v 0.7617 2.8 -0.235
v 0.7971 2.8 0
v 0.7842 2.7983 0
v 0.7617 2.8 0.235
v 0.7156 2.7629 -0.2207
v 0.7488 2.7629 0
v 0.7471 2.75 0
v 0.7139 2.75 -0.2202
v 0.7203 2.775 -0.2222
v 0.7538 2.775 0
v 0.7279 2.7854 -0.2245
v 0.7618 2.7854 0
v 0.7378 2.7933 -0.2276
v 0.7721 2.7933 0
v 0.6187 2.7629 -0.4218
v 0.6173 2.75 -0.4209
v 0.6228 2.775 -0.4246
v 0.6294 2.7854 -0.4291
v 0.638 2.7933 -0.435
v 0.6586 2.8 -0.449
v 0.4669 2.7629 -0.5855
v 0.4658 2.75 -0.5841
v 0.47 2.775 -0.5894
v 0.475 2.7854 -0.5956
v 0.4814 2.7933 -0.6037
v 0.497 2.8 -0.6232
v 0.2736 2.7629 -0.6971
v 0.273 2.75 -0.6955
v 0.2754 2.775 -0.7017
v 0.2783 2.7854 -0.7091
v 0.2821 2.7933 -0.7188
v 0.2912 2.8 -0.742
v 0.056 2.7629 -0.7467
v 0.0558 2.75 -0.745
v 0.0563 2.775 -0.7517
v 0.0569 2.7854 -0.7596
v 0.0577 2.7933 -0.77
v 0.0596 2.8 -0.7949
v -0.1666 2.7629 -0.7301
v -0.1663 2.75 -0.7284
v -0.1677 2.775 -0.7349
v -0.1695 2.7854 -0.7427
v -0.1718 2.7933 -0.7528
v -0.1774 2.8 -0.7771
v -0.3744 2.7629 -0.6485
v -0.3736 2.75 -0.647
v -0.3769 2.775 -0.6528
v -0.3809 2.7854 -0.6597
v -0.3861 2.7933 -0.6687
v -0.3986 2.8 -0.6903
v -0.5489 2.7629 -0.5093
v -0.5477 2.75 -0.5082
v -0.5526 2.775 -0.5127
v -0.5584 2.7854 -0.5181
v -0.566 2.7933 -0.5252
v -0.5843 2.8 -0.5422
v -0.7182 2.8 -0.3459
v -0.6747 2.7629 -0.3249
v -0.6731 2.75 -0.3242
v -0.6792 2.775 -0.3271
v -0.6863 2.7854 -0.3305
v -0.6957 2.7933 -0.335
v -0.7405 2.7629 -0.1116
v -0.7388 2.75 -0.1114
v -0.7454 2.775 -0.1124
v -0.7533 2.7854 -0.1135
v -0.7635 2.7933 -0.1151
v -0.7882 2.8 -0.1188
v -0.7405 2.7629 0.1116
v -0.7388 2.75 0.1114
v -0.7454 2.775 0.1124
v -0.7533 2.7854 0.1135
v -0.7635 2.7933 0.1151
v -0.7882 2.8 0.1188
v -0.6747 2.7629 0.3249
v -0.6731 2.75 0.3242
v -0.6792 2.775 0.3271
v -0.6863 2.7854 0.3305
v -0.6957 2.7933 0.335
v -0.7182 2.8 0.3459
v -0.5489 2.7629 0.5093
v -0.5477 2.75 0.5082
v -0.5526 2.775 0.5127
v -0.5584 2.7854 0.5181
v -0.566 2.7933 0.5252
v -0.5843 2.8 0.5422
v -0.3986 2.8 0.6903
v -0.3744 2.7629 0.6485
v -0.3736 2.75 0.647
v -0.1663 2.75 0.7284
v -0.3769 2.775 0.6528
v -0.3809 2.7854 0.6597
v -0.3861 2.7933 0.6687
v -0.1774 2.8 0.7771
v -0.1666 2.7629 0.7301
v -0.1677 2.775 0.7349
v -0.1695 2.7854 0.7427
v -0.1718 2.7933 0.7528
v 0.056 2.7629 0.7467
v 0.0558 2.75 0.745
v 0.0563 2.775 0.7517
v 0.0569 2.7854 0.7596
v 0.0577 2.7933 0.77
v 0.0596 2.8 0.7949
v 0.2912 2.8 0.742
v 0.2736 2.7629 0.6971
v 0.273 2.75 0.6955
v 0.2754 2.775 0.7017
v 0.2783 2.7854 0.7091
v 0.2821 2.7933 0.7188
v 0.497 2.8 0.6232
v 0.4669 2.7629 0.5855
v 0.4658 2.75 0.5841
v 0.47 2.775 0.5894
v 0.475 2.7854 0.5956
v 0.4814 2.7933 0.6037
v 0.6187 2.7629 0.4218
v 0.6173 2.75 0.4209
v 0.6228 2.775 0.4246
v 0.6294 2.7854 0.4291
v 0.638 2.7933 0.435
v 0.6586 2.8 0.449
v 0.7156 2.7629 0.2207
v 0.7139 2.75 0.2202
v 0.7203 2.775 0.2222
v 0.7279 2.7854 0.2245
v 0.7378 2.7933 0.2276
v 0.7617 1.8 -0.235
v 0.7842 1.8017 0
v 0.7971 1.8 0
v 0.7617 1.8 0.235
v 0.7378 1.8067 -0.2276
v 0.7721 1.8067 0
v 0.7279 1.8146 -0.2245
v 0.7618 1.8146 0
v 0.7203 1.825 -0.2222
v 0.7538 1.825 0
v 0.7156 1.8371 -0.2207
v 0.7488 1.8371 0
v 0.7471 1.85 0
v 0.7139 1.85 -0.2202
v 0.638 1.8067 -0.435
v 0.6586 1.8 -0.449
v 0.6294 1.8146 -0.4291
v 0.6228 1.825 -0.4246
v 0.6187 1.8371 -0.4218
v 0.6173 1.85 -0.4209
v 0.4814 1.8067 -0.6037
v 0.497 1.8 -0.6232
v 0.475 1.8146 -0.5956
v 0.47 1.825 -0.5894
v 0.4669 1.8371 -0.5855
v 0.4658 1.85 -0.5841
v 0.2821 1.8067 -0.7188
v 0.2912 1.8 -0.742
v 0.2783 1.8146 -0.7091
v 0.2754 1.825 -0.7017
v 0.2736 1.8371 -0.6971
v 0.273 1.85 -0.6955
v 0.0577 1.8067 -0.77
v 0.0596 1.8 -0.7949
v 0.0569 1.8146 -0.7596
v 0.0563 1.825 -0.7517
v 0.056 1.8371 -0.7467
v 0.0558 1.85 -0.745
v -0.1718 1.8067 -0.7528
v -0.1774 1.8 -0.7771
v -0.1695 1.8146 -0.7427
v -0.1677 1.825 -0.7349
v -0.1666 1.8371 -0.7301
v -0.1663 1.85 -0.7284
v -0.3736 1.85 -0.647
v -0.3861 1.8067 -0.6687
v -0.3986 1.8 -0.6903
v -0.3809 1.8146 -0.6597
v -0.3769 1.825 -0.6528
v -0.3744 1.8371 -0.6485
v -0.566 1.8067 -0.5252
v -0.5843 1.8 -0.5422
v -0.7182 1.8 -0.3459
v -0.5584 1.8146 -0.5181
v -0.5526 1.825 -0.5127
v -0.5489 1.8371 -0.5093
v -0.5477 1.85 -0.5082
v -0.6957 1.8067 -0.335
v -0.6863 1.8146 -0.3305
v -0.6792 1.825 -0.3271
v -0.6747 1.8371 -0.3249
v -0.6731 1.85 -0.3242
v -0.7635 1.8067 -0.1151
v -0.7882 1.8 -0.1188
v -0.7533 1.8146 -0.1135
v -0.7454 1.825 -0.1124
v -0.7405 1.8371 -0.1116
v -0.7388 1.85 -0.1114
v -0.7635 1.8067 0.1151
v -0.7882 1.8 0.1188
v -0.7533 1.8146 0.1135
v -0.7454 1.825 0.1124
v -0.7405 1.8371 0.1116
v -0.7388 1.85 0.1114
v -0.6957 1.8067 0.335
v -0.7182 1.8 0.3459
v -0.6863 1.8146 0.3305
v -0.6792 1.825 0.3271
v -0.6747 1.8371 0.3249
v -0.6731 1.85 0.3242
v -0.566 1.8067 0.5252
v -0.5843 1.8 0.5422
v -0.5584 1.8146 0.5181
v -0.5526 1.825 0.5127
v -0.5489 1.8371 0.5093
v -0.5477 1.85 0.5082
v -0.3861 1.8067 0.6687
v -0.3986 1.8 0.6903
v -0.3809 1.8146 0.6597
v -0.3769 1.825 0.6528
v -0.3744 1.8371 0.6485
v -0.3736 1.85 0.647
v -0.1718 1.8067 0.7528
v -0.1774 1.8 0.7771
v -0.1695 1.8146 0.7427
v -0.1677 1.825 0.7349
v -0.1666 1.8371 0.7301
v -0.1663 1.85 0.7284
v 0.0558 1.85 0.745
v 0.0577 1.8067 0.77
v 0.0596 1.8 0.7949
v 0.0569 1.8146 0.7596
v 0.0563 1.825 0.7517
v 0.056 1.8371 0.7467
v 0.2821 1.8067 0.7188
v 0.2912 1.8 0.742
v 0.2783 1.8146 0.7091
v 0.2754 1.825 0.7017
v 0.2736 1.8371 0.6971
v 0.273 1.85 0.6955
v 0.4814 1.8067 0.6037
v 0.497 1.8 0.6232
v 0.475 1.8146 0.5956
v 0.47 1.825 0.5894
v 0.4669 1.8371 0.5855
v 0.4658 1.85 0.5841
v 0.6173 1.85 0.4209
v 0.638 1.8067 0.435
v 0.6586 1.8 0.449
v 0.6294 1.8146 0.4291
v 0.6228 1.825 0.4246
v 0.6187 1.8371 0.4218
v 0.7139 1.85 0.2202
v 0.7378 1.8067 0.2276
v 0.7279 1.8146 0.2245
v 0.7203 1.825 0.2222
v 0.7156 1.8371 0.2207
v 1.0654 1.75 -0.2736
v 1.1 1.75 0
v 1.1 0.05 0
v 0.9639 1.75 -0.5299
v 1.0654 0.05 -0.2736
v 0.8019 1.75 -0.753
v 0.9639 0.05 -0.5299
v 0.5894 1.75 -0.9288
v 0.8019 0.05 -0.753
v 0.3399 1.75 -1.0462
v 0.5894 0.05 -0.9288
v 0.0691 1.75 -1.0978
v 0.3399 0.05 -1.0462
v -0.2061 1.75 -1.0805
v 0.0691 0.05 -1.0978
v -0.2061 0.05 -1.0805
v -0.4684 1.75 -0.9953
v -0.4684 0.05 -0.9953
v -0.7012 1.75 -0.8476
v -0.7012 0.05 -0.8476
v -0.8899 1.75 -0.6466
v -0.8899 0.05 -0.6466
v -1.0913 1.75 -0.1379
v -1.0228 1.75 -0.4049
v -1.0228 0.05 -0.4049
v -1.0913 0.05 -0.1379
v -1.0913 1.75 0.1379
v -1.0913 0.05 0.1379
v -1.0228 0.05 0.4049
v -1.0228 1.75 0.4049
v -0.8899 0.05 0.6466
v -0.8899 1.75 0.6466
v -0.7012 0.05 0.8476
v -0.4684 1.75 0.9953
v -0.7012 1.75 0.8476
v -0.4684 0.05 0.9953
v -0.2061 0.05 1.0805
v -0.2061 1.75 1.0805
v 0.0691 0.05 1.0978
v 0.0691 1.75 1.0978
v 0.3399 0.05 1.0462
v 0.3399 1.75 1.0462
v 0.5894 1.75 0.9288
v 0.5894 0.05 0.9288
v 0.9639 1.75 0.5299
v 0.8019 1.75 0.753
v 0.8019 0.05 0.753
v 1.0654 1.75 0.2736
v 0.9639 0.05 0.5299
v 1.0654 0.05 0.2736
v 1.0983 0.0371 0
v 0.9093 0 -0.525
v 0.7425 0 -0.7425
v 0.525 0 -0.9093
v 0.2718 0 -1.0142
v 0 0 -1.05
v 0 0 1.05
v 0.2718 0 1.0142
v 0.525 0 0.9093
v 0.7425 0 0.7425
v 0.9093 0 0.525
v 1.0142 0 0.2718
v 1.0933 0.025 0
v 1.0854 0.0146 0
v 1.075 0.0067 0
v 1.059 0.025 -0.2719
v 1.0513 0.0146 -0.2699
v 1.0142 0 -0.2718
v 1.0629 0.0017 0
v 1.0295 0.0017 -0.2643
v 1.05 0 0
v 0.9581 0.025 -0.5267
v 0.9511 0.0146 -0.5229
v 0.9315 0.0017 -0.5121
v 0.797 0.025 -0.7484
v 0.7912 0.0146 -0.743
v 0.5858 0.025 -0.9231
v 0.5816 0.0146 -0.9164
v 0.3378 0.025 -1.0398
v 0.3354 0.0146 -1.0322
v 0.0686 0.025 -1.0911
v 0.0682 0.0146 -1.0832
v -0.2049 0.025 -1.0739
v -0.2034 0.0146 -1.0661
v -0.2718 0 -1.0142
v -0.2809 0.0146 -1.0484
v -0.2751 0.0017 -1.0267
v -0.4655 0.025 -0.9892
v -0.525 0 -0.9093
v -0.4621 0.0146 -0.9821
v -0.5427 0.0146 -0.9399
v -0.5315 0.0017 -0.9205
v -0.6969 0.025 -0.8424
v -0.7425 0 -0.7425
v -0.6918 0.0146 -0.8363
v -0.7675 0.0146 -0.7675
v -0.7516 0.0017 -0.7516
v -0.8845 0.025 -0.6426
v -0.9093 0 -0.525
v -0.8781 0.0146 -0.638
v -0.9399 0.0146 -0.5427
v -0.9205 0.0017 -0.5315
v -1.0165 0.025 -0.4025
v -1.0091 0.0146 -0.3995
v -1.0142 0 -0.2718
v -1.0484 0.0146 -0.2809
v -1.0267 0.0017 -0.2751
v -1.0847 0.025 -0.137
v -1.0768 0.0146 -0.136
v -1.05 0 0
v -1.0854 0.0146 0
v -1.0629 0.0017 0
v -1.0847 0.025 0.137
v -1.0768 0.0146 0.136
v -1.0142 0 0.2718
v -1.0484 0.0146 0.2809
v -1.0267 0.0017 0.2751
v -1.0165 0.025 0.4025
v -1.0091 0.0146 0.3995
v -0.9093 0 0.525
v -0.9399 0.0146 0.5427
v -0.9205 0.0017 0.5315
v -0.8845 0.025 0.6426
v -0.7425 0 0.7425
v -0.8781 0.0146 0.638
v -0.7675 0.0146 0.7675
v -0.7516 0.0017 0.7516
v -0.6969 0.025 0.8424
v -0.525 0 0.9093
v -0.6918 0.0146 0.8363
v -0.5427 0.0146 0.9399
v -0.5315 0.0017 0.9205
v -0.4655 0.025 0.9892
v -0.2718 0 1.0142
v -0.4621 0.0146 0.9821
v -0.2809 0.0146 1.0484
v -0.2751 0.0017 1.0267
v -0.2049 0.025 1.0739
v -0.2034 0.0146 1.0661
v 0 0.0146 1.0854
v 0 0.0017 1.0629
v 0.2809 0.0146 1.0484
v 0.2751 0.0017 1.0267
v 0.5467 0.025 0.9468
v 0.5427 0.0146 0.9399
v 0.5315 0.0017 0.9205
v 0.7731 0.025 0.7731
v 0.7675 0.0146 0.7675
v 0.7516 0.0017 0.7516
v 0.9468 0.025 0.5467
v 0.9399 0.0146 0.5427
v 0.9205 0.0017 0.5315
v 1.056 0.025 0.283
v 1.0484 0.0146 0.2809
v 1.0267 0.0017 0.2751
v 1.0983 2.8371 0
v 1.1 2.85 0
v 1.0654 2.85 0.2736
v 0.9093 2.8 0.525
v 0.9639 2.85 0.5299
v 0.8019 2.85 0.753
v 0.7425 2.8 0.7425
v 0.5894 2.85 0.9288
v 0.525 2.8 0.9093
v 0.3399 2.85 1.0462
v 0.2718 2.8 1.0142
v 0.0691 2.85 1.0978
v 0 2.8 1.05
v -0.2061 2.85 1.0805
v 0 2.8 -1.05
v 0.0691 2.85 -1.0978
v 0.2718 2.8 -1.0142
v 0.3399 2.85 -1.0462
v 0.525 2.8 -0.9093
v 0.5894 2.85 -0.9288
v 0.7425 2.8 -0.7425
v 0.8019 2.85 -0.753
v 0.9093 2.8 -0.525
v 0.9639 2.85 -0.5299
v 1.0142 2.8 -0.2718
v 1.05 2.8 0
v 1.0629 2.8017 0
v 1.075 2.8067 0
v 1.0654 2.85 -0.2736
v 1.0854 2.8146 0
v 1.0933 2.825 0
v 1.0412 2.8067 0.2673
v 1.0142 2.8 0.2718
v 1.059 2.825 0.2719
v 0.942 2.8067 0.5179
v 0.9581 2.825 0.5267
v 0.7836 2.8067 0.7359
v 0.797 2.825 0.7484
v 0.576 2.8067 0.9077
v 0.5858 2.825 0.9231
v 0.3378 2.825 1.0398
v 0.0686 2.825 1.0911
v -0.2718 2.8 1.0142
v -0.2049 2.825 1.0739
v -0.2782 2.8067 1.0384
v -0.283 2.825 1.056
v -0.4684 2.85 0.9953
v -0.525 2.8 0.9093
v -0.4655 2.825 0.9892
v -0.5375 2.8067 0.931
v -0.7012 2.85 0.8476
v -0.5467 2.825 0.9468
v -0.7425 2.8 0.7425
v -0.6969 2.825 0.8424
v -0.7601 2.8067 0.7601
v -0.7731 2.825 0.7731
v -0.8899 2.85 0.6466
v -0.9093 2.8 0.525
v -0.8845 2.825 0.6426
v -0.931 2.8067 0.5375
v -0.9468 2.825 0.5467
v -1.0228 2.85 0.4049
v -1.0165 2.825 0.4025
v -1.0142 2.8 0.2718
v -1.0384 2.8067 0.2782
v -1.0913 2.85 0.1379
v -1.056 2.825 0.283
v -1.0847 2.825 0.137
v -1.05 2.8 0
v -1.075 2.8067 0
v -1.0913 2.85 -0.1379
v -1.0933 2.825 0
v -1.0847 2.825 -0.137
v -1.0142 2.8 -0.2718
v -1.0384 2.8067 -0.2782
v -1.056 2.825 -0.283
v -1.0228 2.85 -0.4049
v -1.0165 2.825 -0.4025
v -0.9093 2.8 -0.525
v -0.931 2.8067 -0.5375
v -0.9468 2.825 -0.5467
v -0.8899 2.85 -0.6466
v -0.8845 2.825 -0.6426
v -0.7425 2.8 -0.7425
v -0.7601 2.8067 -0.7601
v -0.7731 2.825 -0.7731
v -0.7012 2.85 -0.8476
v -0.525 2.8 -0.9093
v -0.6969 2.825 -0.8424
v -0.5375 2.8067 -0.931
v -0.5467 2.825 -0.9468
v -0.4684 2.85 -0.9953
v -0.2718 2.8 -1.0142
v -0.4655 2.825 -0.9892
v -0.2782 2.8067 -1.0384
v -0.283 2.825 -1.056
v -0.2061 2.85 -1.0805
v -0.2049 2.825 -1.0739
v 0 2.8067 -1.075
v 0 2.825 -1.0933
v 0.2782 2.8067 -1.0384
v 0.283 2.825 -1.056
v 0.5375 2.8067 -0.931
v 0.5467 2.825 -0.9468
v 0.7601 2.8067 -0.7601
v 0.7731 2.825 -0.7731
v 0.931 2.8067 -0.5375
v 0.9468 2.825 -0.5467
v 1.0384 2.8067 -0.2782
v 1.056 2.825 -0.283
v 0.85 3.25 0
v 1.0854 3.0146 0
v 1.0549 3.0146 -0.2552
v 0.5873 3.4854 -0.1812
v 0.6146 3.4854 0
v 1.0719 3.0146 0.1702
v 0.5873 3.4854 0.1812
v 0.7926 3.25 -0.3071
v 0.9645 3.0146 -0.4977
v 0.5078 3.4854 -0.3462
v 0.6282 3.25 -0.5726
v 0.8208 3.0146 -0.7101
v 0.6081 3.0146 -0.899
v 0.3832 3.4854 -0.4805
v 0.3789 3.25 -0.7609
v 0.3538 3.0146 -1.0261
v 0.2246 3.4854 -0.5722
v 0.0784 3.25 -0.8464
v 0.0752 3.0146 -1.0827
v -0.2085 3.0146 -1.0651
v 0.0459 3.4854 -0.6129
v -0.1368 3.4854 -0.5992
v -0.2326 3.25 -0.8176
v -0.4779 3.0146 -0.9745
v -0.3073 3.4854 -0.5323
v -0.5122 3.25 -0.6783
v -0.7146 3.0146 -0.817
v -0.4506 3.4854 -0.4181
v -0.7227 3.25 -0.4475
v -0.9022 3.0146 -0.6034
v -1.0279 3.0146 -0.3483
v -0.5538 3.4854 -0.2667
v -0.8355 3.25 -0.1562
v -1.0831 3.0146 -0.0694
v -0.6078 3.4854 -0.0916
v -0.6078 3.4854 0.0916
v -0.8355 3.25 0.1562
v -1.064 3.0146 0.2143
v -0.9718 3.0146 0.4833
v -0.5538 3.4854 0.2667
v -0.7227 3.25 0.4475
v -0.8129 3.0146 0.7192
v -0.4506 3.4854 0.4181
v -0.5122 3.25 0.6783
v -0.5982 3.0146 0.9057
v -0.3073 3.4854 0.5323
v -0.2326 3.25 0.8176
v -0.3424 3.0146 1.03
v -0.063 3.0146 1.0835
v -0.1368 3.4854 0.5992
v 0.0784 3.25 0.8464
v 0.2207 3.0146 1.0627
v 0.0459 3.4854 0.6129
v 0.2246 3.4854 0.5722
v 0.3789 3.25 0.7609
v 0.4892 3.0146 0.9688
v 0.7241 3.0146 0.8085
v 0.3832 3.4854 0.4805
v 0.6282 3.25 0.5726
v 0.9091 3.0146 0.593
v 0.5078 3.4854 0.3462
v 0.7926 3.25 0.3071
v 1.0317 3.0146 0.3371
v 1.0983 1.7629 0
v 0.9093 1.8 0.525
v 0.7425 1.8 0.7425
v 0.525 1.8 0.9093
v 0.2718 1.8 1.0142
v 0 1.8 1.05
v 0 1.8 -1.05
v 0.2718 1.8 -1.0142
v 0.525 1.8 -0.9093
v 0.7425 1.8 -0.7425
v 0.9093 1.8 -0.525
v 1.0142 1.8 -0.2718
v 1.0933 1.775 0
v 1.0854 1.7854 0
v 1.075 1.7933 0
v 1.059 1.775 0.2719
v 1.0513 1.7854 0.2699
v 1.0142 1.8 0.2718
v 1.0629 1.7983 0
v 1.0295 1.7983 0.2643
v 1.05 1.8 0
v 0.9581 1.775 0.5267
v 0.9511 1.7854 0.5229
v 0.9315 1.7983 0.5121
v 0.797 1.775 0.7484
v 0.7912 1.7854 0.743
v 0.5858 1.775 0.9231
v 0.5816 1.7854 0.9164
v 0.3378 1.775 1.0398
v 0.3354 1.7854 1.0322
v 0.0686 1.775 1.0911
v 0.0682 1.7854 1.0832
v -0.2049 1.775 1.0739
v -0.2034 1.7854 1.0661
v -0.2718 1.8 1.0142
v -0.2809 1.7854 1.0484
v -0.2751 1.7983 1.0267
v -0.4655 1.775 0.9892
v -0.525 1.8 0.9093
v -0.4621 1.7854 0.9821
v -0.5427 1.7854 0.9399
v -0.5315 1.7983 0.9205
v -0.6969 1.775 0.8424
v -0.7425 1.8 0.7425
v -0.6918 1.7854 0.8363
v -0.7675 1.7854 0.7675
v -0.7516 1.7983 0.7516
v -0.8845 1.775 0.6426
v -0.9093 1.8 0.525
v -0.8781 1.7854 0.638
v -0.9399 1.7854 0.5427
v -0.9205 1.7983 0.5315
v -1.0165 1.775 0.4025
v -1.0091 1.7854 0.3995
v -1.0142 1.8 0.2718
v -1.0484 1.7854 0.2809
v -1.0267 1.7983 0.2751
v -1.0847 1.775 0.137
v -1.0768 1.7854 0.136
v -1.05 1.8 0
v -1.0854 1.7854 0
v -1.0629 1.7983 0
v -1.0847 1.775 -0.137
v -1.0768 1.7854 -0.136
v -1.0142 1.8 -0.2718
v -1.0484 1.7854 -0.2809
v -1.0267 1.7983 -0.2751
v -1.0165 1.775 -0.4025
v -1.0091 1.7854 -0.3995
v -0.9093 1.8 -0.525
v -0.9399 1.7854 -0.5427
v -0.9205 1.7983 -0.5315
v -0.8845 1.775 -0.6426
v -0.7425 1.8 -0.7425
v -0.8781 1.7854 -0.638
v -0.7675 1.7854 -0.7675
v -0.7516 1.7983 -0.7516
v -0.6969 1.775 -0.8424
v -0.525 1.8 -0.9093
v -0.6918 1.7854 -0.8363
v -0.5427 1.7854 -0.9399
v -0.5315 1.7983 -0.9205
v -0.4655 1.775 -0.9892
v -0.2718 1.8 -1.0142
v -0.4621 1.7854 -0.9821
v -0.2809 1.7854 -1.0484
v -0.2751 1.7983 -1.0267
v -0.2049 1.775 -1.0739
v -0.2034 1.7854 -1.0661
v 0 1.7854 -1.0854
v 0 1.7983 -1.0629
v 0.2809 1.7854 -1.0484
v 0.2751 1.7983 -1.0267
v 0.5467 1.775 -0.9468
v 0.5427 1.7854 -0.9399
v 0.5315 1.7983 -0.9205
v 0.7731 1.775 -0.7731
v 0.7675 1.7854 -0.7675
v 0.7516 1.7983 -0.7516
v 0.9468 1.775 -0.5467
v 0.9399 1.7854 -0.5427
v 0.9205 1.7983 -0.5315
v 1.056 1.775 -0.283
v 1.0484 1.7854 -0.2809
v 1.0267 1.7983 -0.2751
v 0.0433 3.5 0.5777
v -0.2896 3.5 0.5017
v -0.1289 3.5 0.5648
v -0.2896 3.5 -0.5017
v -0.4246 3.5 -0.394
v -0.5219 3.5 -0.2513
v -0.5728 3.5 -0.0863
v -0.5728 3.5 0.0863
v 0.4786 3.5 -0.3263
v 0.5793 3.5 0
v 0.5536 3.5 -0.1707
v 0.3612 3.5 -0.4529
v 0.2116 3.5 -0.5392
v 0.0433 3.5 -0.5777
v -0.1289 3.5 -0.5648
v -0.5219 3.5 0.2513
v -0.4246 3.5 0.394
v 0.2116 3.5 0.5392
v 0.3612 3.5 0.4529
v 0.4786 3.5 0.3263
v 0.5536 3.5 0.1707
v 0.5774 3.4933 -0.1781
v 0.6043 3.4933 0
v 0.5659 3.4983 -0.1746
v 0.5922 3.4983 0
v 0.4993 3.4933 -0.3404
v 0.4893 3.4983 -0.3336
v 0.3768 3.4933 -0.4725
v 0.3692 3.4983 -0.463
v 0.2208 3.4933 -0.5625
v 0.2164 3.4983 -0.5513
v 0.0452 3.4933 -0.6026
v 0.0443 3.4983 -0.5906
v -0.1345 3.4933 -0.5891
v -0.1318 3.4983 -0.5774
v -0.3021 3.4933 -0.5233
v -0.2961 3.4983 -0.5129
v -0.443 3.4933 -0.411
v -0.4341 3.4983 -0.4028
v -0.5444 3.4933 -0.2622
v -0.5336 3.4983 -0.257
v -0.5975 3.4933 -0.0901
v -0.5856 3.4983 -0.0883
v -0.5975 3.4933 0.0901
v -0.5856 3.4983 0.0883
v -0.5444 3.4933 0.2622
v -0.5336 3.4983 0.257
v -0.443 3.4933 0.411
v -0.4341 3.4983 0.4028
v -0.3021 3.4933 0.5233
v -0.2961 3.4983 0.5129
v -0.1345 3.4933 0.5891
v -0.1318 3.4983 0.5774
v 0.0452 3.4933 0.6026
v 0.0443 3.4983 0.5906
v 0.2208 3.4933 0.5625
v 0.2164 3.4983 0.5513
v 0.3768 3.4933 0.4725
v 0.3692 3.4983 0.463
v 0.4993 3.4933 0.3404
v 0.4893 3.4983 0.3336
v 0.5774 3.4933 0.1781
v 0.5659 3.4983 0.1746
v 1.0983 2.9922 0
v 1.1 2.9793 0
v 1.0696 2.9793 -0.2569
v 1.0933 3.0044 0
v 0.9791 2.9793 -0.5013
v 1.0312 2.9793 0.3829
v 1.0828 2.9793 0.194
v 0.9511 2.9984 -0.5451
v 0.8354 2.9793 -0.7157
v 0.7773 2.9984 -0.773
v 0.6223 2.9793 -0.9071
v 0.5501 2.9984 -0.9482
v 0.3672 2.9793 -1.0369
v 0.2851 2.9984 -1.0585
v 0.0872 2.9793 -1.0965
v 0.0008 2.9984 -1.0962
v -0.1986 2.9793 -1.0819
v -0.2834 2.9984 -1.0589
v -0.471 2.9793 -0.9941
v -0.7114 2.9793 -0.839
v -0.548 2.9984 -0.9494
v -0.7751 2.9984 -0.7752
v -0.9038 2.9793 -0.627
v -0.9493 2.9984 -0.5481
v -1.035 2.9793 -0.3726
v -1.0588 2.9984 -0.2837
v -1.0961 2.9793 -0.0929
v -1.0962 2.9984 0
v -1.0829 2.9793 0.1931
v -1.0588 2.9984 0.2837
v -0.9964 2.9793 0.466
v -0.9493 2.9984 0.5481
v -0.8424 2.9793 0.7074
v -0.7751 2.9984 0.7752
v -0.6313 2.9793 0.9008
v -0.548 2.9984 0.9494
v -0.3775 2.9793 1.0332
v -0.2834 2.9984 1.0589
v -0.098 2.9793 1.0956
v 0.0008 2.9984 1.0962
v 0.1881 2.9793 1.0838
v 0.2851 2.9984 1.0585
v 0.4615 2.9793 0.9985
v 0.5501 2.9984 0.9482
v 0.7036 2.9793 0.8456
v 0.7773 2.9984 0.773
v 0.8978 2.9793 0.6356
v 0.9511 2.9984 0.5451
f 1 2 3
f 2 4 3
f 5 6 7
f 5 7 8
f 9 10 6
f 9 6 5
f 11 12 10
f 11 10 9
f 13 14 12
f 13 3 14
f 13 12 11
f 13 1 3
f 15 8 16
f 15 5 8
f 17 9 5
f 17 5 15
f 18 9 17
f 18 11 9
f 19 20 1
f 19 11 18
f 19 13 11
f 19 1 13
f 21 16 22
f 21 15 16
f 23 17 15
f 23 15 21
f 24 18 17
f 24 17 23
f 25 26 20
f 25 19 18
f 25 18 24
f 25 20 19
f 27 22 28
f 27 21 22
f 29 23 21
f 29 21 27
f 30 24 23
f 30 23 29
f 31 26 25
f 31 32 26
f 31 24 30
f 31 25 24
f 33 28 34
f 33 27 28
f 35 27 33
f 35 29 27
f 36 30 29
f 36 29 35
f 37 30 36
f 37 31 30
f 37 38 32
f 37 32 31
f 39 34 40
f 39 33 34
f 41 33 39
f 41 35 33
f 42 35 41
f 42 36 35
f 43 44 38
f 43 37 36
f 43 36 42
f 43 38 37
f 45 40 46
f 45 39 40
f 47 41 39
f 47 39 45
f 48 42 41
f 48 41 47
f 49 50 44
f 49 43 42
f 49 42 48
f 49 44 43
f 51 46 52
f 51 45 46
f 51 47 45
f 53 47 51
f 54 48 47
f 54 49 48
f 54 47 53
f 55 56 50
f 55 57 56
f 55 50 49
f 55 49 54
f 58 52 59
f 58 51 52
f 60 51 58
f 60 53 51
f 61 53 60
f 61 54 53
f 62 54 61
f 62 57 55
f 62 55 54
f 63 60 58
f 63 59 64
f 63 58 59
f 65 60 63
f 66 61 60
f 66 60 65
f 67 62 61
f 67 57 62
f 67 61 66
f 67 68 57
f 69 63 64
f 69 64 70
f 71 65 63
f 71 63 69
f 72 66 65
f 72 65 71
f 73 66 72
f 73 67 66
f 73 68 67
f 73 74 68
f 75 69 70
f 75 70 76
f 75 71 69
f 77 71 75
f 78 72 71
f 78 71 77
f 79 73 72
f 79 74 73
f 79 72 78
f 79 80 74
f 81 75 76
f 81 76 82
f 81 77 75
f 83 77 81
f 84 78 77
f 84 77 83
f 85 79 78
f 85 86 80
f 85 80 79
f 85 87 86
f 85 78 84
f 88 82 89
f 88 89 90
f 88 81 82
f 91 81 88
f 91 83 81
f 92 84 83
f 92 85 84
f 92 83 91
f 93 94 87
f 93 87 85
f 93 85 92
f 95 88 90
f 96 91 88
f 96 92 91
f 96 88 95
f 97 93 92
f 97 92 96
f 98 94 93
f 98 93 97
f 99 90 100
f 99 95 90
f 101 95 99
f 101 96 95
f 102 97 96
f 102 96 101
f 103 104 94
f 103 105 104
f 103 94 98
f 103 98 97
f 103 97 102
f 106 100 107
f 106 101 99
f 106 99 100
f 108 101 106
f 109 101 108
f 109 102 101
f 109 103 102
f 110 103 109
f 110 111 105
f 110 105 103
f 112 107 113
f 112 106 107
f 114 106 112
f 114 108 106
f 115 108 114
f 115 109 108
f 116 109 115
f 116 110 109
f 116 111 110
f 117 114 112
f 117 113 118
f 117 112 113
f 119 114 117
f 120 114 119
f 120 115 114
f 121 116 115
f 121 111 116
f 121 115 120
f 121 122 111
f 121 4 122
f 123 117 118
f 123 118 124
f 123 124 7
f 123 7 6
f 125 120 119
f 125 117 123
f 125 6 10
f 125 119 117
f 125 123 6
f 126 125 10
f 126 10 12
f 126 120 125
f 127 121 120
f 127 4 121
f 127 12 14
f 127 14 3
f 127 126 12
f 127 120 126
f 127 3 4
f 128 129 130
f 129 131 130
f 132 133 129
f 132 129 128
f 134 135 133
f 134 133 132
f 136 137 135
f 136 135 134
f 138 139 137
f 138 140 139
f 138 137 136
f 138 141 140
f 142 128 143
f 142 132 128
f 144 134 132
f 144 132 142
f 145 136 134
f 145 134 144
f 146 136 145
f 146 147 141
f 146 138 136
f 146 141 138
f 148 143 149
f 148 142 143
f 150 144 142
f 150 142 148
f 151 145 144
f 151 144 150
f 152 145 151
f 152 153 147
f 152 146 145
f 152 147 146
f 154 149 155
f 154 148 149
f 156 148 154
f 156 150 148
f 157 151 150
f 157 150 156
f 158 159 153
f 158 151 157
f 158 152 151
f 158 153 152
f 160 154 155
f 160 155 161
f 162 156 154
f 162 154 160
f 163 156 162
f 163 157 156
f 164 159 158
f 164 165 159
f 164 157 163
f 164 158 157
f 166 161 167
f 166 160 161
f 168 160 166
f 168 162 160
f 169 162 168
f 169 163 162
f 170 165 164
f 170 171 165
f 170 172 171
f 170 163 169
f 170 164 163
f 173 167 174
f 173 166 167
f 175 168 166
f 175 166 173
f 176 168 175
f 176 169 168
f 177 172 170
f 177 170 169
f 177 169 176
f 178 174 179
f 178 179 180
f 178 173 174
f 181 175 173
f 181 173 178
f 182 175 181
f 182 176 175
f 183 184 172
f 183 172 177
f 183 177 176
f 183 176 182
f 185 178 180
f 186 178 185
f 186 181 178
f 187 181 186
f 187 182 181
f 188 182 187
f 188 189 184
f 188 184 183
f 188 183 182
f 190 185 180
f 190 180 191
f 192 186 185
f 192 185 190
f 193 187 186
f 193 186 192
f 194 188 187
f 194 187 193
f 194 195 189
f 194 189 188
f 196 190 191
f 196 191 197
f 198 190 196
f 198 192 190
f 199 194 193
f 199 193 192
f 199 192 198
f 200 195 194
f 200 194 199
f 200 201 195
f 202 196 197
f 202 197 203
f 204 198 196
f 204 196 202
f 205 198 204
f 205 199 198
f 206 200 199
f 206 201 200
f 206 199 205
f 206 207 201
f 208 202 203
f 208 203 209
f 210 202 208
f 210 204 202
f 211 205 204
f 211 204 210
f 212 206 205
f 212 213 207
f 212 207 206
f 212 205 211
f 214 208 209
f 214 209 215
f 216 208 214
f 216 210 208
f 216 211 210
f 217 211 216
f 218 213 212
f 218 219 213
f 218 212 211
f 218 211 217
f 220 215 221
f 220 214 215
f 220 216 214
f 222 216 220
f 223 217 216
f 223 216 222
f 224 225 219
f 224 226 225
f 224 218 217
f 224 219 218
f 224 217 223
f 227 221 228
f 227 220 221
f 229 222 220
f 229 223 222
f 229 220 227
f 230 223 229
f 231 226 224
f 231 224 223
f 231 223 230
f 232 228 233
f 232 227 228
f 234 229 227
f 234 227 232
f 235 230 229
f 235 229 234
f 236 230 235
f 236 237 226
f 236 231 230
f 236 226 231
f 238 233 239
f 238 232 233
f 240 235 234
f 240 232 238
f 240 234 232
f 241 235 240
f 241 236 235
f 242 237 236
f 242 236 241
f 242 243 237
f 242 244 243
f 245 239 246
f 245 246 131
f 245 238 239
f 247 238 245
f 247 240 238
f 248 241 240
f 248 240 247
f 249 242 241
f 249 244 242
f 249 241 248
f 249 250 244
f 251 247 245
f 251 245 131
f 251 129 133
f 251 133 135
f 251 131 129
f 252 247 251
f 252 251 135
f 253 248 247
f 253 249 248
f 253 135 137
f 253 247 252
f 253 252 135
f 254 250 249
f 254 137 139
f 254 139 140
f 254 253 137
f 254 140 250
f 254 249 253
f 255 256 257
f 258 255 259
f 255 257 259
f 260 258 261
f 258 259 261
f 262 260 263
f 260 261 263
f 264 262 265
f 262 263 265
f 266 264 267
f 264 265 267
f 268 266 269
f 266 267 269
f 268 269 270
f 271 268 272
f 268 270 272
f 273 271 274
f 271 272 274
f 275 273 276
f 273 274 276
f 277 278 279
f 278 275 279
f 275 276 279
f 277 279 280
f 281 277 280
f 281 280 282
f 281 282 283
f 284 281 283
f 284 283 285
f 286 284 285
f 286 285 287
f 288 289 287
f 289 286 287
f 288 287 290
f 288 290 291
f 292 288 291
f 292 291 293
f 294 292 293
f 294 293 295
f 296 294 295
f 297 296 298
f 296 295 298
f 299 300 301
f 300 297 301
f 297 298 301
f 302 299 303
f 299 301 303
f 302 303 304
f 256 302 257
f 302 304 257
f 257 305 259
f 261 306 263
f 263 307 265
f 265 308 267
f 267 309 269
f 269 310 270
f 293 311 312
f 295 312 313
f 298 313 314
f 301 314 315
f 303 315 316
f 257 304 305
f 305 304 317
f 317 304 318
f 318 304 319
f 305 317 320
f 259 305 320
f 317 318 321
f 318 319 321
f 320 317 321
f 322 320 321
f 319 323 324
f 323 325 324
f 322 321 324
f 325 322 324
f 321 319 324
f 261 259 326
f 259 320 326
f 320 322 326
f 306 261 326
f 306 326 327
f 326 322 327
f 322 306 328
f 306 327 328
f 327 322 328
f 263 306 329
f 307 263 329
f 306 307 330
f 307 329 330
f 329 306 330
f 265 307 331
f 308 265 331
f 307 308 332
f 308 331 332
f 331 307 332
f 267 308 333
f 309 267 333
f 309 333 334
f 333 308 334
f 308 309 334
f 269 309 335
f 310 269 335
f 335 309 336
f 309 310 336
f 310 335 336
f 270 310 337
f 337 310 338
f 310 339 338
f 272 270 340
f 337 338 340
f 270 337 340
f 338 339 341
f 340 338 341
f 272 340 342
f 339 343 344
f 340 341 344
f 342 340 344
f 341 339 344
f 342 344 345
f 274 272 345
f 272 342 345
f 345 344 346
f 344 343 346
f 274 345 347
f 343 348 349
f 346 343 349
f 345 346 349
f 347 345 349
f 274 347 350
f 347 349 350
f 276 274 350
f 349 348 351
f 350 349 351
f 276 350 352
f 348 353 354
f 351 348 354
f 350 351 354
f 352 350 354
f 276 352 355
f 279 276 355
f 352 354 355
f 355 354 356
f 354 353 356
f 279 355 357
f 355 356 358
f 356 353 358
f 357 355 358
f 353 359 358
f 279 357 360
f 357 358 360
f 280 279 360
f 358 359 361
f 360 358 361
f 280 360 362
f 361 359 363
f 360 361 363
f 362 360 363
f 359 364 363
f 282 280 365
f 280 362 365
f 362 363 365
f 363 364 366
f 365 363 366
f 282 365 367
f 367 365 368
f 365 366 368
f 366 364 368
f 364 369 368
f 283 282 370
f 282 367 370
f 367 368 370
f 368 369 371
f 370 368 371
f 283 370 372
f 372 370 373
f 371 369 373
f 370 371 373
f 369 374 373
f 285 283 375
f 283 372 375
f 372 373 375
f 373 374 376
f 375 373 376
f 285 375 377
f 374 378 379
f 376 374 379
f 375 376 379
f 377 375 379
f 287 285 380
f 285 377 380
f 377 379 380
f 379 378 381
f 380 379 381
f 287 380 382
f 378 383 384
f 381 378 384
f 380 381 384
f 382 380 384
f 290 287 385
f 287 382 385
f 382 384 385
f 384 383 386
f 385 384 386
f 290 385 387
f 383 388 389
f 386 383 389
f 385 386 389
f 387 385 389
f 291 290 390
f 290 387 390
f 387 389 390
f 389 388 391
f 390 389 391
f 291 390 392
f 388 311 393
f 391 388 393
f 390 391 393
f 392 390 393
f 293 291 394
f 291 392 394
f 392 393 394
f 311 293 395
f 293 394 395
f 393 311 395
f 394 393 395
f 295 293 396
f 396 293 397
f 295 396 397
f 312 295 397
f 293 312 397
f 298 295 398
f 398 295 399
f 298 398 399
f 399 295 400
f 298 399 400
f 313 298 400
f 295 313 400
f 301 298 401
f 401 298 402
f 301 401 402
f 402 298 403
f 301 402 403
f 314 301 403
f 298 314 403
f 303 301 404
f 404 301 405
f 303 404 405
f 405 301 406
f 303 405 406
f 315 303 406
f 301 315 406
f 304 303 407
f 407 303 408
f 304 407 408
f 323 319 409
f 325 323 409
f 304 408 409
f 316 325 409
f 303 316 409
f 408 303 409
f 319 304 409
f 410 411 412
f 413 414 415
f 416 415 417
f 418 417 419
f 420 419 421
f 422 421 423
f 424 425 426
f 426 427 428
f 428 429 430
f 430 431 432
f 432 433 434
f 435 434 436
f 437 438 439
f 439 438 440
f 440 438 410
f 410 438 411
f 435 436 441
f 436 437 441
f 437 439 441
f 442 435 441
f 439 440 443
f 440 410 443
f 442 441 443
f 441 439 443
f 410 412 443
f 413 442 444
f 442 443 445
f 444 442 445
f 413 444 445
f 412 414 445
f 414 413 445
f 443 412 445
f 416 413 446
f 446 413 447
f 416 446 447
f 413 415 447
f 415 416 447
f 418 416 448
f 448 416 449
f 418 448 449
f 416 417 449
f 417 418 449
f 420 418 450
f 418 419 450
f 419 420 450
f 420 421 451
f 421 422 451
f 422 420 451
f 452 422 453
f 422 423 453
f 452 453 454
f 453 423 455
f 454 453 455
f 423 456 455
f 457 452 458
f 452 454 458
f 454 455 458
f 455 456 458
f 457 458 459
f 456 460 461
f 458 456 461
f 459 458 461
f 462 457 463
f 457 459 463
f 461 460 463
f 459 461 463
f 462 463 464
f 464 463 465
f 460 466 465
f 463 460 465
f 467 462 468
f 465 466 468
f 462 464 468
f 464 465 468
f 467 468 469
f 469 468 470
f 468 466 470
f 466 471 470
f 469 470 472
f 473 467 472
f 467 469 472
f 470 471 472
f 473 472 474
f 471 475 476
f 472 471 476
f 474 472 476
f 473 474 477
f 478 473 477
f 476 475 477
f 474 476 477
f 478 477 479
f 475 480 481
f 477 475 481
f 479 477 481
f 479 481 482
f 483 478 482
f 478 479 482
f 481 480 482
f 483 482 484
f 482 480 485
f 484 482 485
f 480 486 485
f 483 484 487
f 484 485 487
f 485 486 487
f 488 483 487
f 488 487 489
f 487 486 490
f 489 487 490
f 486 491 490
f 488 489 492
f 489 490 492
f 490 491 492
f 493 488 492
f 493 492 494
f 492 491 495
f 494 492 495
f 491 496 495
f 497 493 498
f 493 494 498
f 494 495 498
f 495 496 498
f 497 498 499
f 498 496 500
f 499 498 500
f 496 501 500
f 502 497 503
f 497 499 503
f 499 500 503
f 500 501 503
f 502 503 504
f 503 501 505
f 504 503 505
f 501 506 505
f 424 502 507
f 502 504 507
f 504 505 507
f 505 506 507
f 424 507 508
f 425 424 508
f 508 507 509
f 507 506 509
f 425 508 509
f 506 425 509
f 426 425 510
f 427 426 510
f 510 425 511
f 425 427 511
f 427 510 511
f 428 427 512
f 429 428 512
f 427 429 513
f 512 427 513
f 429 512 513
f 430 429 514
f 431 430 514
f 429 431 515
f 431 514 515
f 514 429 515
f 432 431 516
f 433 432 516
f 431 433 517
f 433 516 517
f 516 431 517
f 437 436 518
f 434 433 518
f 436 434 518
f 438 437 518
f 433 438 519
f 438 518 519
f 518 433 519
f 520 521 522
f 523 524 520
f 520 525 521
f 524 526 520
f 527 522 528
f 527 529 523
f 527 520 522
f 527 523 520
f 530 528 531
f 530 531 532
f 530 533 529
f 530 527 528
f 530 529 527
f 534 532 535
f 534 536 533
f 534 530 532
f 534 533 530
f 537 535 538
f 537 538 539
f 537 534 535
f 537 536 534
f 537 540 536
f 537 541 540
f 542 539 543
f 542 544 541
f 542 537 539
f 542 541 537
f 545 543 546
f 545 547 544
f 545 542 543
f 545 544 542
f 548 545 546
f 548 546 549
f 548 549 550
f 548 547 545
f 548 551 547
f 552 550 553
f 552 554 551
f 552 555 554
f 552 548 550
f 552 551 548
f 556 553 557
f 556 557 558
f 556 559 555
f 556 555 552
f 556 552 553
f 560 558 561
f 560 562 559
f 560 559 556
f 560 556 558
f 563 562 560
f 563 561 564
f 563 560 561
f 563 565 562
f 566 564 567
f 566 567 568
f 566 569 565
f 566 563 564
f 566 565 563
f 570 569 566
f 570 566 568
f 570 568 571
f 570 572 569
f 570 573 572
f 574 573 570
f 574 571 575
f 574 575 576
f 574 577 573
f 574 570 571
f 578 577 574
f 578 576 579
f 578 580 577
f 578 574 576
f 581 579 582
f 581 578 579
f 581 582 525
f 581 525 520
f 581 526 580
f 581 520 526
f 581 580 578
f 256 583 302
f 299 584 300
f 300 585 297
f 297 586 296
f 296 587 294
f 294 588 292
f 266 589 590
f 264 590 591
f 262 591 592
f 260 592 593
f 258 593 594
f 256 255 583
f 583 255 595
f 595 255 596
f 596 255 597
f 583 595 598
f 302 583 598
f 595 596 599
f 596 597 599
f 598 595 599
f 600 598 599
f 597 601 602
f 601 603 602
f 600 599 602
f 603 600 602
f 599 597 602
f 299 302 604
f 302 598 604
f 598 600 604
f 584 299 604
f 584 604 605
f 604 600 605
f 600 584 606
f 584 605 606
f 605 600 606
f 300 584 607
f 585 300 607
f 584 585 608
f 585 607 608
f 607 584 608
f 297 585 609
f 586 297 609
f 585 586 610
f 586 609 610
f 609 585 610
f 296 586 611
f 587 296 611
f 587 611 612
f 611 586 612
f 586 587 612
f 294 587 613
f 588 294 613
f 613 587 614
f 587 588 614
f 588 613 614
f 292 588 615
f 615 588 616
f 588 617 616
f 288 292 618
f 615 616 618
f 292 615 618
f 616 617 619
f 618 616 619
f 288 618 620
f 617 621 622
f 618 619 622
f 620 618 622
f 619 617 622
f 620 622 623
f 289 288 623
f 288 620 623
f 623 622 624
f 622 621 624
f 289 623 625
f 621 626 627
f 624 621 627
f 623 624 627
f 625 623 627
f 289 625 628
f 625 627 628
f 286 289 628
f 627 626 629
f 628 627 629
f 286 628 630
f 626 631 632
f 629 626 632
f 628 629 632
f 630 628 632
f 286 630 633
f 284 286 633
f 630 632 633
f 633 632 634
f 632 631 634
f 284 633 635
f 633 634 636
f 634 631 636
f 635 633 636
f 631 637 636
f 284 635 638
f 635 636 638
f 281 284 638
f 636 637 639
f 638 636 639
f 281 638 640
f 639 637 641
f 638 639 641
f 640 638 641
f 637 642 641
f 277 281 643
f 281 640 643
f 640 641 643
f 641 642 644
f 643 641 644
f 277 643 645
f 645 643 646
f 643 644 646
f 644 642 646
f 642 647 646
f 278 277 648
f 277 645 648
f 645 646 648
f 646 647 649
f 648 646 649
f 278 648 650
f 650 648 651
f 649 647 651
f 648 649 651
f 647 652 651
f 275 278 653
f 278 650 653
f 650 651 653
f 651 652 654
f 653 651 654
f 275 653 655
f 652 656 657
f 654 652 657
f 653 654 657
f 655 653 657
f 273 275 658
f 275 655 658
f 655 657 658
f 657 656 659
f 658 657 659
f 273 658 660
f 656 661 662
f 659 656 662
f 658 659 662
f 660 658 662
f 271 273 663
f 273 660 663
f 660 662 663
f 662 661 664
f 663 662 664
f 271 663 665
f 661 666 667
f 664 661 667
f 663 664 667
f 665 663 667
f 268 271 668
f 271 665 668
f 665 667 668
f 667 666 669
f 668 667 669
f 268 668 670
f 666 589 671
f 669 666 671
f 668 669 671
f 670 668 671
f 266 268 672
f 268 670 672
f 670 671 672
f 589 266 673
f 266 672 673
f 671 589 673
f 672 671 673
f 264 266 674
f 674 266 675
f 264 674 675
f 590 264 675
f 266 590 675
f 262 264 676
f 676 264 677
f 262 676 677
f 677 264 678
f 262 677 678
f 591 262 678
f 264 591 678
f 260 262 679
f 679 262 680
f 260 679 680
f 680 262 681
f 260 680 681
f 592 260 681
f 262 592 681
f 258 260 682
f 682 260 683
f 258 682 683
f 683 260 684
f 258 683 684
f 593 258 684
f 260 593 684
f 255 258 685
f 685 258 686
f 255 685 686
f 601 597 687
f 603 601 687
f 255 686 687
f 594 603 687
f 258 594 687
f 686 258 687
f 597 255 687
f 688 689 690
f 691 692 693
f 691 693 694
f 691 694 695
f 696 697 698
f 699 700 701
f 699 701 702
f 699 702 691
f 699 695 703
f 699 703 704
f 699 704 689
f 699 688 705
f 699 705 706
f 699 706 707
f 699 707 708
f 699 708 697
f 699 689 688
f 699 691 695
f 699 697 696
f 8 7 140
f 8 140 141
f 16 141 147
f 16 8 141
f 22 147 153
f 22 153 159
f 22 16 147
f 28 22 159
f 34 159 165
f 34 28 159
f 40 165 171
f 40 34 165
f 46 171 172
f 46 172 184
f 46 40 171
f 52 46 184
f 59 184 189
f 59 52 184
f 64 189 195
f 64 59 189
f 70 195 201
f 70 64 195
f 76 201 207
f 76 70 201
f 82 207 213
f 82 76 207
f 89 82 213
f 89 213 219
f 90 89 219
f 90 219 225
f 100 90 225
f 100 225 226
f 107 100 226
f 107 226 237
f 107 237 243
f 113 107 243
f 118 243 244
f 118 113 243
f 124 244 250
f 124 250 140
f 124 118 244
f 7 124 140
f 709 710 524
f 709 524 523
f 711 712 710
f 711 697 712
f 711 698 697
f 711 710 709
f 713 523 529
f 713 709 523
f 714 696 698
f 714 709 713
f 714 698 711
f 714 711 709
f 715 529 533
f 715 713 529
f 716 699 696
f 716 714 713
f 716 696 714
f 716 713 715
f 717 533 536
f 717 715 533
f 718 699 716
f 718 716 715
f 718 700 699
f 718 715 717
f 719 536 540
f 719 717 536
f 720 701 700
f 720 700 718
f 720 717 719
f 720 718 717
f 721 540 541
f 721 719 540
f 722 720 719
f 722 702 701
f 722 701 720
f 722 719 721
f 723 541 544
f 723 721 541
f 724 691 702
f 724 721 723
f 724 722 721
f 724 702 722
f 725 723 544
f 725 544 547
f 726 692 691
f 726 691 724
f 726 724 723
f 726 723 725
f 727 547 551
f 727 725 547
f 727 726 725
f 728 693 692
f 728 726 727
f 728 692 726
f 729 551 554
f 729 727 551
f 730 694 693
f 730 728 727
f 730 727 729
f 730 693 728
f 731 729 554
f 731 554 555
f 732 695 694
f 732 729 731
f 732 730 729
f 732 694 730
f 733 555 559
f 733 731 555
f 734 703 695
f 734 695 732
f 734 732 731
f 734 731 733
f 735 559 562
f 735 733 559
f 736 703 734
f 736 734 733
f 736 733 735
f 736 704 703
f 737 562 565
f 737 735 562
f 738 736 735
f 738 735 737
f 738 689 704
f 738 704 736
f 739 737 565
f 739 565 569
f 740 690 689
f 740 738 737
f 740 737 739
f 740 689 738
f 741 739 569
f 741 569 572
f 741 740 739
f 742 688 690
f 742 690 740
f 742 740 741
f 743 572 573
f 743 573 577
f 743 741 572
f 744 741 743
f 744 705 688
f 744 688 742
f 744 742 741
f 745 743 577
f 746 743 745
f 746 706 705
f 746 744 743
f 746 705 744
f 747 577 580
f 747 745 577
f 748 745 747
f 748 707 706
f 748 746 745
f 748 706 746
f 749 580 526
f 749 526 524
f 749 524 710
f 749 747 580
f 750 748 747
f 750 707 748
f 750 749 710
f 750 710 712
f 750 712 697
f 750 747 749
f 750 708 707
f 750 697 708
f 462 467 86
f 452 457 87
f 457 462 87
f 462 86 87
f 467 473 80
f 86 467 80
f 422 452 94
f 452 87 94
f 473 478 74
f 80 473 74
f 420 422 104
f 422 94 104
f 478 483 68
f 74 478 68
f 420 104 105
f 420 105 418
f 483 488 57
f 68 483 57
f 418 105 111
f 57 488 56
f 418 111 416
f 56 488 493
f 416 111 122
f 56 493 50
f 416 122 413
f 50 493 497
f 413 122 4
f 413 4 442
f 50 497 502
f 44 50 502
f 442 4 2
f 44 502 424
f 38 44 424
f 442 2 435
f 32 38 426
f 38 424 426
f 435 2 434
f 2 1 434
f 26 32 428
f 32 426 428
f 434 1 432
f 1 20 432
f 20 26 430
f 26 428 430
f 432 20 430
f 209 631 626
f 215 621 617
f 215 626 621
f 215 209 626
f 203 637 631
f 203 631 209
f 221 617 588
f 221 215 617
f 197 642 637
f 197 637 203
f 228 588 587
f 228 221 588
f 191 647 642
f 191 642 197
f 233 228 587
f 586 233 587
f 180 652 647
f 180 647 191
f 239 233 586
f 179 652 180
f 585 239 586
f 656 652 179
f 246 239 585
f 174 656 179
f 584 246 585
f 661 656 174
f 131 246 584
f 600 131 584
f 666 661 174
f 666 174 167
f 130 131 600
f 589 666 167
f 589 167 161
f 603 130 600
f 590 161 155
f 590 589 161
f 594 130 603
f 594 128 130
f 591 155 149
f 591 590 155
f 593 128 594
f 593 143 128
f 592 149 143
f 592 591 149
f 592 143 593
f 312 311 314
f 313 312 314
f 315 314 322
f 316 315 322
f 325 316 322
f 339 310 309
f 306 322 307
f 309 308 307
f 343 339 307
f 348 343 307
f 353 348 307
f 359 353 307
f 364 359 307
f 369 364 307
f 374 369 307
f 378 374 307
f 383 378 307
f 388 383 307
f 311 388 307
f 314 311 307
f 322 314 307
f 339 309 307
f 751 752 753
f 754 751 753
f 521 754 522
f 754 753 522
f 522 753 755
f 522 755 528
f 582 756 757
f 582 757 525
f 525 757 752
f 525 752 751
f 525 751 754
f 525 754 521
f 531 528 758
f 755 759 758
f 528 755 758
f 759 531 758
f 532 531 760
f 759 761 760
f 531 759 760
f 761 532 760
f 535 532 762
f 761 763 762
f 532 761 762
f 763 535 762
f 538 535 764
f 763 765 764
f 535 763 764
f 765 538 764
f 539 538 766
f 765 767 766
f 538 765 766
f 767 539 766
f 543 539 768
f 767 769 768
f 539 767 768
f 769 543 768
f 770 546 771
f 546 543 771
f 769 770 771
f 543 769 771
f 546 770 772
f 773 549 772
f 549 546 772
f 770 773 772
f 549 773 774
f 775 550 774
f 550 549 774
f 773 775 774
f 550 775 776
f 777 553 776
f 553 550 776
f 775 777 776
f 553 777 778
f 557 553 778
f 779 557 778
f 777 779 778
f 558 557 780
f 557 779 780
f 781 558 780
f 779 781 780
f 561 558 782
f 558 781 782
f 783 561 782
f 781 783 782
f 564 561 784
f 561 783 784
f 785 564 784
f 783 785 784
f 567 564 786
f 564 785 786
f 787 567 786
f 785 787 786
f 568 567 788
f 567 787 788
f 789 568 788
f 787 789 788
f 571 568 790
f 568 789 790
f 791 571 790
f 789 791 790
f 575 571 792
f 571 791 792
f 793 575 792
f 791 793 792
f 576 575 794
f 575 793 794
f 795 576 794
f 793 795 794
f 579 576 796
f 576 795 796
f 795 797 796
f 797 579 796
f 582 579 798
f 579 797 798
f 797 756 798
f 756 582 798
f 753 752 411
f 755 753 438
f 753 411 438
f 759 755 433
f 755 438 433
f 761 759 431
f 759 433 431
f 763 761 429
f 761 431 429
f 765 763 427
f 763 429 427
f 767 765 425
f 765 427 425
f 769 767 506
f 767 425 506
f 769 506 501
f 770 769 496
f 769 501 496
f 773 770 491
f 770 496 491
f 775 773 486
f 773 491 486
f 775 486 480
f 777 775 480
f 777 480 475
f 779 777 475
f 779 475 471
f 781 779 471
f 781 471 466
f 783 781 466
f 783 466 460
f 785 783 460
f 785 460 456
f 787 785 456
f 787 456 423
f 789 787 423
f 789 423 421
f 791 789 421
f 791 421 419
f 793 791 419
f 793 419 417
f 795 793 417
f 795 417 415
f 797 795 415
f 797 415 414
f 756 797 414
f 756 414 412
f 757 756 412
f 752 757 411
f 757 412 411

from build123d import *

# Parameters (mm, degrees)
SKETCH1_R           = 1.1
BOSS_EXTRUDE1_DEPTH = 3.5
CHAMFER1_SIZE       = 0.5
CUT_EXTRUDE1_START  = -0.7
SKETCH2_R           = 1.396092668
SKETCH2_R_2         = 0.747130163
CUT_EXTRUDE1_DEPTH  = 1
FILLET1_R           = 0.05


with BuildPart() as part:
    # Sketch1 → Boss-Extrude1 (new body)
    with BuildSketch(Plane(origin=(0, 0, 0), x_dir=(1, 0, 0), z_dir=(0, 1, 0))):
        Circle(SKETCH1_R)
    extrude(amount=BOSS_EXTRUDE1_DEPTH)

    # Chamfer1
    chamfer1_edges = [part.edges().sort_by_distance(p)[0] for p in [
        (-1.1, 3.5, 0),
    ]]
    chamfer(chamfer1_edges, length=CHAMFER1_SIZE)

    # Sketch2 → Cut-Extrude1 (cut)
    with BuildSketch(Plane(origin=(0, 3.5, 0), x_dir=(1, 0, 0), z_dir=(0, 1, 0)).offset(CUT_EXTRUDE1_START)):
        Circle(SKETCH2_R)
        Circle(SKETCH2_R_2, mode=Mode.SUBTRACT)
    extrude(amount=-CUT_EXTRUDE1_DEPTH, mode=Mode.SUBTRACT)

    # Fillet1
    fillet1_edges = [part.edges().sort_by_distance(p)[0] for p in [
        (-1.1, 2.8, 0),
        (-1.1, 1.8, 0),
        (-0.747130163, 2.8, 0),
        (-1.1, 0, 0),
        (-0.6, 3.5, 0),
        (-1.1, 3, 0),
        (-0.747130163, 1.8, 0),
    ]]
    fillet(fillet1_edges, radius=FILLET1_R)


solid = part.part
